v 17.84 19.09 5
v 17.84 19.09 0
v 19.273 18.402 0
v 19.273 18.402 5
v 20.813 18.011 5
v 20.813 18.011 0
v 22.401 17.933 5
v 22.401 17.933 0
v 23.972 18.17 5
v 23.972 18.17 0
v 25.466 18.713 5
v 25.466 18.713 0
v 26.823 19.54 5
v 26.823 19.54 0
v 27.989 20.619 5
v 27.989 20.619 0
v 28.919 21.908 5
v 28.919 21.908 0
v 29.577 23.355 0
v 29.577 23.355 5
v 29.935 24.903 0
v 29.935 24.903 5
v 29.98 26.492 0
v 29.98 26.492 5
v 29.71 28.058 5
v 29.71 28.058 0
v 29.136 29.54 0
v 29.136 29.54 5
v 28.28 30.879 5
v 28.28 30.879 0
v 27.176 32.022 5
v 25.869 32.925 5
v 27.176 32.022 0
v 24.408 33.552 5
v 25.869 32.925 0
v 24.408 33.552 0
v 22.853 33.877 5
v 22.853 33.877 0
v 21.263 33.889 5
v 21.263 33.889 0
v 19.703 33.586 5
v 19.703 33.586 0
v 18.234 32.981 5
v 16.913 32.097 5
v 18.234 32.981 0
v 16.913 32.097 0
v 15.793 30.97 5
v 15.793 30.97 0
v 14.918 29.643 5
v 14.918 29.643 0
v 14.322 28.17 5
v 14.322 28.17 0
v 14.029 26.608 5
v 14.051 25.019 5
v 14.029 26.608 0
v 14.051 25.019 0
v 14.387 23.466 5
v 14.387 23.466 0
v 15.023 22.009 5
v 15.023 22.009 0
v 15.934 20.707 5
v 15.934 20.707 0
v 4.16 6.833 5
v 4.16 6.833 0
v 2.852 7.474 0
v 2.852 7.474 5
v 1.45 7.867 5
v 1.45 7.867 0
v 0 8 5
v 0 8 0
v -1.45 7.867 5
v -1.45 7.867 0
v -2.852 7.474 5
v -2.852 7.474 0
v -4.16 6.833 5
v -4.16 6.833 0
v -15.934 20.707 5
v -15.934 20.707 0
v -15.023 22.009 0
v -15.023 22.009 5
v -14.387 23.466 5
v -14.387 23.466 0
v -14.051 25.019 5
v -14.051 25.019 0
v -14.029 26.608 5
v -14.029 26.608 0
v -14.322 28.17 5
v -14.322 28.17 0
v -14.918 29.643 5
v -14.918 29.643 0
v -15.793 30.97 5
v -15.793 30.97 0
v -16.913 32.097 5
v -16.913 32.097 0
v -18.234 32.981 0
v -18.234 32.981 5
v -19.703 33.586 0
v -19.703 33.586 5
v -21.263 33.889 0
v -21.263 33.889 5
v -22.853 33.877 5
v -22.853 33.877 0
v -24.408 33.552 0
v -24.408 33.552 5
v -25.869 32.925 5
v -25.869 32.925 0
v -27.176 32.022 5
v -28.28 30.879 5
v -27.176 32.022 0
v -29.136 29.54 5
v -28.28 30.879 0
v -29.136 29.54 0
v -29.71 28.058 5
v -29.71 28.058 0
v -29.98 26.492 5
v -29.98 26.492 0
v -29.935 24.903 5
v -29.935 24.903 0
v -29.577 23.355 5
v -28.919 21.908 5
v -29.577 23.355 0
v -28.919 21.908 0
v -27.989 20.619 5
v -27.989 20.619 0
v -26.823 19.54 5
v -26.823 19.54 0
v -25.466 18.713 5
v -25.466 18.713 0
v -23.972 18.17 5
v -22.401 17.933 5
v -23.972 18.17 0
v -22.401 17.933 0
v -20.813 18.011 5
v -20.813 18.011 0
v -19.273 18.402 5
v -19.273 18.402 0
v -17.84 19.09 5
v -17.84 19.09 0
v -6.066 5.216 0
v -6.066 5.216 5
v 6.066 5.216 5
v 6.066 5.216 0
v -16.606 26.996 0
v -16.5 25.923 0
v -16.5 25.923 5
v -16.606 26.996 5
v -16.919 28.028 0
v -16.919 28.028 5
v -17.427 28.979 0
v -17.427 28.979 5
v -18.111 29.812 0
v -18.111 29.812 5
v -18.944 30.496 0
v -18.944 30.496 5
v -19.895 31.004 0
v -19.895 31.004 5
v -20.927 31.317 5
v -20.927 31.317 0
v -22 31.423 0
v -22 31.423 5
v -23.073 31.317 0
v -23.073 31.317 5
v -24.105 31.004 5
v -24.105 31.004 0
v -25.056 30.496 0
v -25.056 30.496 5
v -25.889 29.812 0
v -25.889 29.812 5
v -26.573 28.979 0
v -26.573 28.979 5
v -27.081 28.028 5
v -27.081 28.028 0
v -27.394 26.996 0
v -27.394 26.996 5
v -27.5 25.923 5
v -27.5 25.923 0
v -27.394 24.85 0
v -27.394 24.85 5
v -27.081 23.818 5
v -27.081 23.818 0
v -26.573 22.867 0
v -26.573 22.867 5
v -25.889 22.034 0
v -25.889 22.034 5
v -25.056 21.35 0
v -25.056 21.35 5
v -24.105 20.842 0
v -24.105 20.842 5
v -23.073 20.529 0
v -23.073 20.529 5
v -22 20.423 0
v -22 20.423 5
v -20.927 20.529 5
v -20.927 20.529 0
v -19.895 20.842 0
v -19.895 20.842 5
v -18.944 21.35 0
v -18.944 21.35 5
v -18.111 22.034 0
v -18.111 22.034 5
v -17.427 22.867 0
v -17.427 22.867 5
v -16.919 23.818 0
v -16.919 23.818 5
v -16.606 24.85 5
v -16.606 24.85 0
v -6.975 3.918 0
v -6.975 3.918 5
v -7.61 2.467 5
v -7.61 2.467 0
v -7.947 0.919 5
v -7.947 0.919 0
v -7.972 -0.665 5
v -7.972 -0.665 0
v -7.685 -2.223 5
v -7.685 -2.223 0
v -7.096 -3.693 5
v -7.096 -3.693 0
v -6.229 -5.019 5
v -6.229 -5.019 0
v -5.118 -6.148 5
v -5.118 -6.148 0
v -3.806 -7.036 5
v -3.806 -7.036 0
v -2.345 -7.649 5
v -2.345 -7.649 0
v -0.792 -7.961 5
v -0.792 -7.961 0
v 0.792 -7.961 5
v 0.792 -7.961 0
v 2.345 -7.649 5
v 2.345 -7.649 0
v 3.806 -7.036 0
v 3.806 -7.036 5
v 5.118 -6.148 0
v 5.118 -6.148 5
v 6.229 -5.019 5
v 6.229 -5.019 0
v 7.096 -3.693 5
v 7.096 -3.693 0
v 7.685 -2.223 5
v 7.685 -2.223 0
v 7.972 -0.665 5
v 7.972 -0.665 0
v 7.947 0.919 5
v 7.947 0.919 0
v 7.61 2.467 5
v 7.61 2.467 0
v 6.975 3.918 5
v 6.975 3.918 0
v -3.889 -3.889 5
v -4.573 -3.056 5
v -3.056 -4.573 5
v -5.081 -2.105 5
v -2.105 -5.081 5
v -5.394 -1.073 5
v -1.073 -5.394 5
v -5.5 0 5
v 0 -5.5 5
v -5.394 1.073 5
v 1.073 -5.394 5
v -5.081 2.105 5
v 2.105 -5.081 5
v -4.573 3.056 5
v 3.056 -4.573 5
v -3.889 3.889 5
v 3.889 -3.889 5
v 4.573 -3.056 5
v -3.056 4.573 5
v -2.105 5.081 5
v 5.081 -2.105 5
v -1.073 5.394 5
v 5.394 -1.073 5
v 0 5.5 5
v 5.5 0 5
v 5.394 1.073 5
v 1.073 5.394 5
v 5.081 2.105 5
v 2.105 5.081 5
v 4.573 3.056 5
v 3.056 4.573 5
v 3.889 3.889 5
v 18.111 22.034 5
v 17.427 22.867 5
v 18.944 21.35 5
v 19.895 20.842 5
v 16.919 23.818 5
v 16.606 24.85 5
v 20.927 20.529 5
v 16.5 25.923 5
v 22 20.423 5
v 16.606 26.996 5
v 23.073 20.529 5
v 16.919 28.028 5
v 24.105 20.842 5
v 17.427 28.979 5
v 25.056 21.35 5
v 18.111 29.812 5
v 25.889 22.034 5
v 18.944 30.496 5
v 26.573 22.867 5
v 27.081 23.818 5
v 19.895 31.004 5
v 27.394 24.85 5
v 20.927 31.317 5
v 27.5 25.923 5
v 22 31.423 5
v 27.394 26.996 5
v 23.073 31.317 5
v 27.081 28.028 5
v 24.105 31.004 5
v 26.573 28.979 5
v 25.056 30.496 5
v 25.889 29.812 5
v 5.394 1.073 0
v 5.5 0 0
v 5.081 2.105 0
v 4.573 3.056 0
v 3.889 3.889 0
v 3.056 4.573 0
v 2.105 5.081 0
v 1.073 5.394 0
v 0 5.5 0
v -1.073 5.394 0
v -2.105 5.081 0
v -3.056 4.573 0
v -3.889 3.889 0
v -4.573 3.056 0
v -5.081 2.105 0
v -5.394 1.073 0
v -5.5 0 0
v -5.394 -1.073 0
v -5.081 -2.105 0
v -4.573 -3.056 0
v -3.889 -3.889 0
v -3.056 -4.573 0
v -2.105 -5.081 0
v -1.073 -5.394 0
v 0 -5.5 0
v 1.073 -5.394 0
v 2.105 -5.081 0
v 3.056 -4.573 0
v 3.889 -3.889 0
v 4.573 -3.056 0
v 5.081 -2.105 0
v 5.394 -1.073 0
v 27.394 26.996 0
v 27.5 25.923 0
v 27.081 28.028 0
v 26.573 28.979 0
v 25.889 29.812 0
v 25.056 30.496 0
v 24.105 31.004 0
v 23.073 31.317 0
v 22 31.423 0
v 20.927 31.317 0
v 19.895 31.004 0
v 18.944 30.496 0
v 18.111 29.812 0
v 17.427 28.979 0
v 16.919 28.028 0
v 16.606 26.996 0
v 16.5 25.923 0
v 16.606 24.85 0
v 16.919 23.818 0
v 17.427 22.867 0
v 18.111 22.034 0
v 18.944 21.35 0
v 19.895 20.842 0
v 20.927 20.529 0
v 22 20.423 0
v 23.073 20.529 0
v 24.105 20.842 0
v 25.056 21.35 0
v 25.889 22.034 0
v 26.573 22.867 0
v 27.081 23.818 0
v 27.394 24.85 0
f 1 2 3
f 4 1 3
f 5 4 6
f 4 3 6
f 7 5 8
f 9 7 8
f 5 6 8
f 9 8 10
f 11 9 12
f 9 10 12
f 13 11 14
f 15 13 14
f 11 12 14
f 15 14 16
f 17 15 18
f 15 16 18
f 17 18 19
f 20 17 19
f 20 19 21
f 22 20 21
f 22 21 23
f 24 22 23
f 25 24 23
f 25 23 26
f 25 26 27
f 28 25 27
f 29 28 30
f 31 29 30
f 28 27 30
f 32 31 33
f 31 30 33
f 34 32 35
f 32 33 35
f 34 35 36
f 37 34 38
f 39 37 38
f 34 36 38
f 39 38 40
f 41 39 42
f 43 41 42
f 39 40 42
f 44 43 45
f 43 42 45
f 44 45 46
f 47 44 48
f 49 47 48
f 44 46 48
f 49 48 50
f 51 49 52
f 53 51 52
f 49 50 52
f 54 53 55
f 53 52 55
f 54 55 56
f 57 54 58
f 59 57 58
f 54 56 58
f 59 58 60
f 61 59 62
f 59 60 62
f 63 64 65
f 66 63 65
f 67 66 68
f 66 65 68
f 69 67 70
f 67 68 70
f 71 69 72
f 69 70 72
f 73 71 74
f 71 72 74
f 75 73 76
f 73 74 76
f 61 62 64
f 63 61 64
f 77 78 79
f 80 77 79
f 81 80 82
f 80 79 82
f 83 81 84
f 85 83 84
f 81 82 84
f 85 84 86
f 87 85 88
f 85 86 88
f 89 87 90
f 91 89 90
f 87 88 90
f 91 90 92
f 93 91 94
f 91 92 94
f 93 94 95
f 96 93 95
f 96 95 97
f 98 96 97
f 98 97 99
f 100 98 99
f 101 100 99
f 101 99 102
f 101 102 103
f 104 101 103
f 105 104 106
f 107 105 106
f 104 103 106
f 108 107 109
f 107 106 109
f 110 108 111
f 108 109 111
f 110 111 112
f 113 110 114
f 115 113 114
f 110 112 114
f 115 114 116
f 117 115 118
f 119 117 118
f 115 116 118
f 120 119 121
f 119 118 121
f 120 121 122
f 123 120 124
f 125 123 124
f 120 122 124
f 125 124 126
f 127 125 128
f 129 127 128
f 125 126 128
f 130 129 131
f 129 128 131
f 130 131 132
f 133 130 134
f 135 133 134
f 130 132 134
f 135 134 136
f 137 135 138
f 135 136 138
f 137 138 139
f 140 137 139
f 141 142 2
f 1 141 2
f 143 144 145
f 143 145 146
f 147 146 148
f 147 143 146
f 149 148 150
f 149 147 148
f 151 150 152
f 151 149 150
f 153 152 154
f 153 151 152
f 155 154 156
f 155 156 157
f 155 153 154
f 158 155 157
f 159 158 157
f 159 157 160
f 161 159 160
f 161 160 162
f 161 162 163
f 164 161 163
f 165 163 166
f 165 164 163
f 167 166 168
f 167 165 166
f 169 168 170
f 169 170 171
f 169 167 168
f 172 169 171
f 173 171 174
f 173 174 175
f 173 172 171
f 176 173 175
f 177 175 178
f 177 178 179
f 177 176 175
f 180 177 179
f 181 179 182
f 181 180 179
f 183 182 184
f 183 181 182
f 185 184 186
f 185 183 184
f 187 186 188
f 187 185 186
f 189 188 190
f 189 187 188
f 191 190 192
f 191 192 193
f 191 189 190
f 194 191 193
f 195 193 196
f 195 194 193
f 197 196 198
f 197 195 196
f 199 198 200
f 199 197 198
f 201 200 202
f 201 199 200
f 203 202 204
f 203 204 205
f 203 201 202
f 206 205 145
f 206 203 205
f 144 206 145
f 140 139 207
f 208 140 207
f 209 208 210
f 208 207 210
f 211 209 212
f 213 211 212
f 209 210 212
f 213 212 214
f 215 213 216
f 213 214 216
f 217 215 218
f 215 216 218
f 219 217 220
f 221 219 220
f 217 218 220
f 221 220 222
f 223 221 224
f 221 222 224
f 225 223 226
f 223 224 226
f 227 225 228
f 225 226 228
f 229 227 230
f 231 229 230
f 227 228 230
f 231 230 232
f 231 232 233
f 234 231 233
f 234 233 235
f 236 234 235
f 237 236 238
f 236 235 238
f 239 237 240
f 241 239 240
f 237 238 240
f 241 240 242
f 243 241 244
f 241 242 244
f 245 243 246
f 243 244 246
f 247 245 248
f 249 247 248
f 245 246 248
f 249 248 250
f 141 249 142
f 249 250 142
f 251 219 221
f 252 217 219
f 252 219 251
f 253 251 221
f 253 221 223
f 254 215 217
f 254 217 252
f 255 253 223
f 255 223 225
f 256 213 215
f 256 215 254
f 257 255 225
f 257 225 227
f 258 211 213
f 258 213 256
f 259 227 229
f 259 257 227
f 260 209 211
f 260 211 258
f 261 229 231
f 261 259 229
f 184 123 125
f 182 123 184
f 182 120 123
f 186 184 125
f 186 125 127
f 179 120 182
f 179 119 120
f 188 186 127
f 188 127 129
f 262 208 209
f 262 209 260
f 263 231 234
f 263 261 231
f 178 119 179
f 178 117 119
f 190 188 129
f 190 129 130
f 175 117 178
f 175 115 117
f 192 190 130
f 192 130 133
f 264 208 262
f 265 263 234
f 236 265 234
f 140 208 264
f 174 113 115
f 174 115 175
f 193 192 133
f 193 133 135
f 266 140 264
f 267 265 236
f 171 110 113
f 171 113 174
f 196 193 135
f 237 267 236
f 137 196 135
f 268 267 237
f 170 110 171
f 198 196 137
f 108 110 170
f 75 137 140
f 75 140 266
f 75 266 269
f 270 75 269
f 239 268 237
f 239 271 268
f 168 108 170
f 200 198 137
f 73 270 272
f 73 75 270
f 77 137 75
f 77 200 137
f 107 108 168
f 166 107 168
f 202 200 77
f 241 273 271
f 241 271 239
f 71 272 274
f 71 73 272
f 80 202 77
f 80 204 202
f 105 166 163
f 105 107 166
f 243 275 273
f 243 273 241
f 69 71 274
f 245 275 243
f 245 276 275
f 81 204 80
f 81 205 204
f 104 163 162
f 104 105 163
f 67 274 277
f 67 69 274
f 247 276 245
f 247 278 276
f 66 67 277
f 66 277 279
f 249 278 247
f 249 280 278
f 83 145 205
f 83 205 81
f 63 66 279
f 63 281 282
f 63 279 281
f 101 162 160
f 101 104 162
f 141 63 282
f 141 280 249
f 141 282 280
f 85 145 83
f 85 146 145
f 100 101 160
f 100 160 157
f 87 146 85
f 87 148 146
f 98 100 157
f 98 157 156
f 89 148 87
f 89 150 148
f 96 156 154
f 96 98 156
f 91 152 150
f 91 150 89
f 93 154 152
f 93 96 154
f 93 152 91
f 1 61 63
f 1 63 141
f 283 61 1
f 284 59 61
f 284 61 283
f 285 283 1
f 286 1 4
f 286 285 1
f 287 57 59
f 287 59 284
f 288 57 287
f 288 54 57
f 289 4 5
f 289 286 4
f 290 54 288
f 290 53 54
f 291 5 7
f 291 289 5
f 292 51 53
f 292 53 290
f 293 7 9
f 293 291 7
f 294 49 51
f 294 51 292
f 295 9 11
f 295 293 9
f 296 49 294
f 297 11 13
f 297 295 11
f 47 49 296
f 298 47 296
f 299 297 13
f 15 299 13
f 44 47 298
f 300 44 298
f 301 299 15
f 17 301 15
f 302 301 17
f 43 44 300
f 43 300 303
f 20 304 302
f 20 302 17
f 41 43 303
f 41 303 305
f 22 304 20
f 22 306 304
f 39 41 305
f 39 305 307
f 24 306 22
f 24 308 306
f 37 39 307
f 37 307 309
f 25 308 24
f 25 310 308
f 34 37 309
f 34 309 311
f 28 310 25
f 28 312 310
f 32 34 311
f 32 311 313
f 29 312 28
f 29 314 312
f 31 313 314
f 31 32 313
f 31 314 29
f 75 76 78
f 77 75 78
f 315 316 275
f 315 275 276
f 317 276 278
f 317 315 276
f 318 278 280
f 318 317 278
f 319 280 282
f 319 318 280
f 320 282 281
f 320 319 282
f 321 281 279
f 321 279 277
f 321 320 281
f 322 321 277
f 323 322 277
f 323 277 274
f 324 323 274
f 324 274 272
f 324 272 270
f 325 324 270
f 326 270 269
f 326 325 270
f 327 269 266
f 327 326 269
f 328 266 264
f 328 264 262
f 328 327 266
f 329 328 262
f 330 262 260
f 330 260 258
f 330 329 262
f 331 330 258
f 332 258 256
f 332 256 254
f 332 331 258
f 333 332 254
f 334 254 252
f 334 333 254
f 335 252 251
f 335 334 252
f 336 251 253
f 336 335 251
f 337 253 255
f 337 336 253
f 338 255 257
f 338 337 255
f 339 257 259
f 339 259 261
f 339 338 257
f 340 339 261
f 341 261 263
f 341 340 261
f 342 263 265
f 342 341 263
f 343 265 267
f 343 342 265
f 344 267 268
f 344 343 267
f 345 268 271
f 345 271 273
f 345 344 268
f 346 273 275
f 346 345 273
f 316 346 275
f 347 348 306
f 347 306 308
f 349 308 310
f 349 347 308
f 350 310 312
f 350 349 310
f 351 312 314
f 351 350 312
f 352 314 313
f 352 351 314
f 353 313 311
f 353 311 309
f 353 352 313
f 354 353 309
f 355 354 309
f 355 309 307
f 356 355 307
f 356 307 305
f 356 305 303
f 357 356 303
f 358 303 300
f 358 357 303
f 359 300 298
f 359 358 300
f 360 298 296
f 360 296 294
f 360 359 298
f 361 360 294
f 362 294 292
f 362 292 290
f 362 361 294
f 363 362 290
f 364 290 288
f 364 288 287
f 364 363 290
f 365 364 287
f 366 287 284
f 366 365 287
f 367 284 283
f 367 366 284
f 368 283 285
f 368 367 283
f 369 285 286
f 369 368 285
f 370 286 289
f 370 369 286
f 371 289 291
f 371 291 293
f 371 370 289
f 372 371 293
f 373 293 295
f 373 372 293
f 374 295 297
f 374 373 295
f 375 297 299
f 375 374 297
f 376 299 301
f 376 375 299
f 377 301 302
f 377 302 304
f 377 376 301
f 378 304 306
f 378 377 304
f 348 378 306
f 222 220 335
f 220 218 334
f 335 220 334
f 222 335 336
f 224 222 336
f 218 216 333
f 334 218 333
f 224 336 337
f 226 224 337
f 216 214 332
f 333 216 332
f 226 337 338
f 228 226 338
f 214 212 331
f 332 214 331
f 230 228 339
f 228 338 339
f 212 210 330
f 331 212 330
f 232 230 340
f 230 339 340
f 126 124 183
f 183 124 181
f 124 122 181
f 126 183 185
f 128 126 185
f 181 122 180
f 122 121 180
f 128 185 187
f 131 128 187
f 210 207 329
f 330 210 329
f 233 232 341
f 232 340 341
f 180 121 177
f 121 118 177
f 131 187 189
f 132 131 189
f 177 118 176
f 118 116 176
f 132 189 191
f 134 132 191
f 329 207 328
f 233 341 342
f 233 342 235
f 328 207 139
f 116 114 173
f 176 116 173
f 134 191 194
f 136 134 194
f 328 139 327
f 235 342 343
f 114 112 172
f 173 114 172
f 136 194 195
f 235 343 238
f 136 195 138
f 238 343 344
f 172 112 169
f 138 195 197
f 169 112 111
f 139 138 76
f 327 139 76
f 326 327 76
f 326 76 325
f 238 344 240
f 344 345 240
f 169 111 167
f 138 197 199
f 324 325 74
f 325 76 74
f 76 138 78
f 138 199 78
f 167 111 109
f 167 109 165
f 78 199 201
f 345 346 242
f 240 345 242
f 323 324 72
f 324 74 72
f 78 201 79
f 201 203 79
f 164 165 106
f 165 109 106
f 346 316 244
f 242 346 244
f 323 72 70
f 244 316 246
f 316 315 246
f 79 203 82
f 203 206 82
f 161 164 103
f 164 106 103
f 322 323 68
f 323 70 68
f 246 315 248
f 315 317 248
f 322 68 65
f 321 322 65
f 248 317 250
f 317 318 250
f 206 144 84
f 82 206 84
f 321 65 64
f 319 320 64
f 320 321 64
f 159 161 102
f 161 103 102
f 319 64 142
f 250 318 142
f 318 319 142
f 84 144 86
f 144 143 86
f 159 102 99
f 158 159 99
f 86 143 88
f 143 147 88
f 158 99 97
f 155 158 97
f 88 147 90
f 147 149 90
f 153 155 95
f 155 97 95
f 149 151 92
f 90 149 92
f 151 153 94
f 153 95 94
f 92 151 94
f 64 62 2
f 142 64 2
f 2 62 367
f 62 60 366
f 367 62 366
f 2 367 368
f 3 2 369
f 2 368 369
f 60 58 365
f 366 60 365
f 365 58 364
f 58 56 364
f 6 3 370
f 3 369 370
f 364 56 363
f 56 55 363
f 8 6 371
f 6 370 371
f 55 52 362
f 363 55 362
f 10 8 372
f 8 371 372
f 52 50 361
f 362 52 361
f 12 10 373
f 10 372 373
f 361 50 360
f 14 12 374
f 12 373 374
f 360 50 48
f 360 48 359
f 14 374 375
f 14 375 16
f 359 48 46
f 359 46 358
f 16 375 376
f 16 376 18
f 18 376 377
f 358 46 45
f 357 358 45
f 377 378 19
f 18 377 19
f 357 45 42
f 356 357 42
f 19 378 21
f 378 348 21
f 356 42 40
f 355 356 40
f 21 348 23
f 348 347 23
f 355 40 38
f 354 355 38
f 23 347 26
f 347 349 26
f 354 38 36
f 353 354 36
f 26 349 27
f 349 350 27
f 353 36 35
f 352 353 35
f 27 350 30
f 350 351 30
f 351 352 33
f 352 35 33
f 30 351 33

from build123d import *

# Parameters (mm, degrees)
F0_R     = 5.5
F1_DEPTH = 5


with BuildPart() as f1:
    # F0 (on Top) → F1 (new body)
    with BuildSketch(Plane.XY):
        with BuildLine():
            Line((-17.840159, 19.089536), (-6.065941, 5.21578))
            ThreePointArc((-6.065941, 5.21578), (0, -8), (6.065941, 5.21578))
            Line((6.065941, 5.21578), (17.840159, 19.089536))
            ThreePointArc((17.840159, 19.089536), (27.176471, 32.022483), (15.934059, 20.707183))
            Line((15.934059, 20.707183), (4.159841, 6.833427))
            ThreePointArc((4.159841, 6.833427), (0, 8), (-4.159841, 6.833427))
            Line((-4.159841, 6.833427), (-15.934059, 20.707183))
            ThreePointArc((-15.934059, 20.707183), (-27.176471, 32.022483), (-17.840159, 19.089536))
        make_face()
        Circle(F0_R, mode=Mode.SUBTRACT)
        with Locations((-22, 25.922963)):
            Circle(F0_R, mode=Mode.SUBTRACT)
        with Locations((22, 25.922963)):
            Circle(F0_R, mode=Mode.SUBTRACT)
    extrude(amount=F1_DEPTH)


solid = f1.part
